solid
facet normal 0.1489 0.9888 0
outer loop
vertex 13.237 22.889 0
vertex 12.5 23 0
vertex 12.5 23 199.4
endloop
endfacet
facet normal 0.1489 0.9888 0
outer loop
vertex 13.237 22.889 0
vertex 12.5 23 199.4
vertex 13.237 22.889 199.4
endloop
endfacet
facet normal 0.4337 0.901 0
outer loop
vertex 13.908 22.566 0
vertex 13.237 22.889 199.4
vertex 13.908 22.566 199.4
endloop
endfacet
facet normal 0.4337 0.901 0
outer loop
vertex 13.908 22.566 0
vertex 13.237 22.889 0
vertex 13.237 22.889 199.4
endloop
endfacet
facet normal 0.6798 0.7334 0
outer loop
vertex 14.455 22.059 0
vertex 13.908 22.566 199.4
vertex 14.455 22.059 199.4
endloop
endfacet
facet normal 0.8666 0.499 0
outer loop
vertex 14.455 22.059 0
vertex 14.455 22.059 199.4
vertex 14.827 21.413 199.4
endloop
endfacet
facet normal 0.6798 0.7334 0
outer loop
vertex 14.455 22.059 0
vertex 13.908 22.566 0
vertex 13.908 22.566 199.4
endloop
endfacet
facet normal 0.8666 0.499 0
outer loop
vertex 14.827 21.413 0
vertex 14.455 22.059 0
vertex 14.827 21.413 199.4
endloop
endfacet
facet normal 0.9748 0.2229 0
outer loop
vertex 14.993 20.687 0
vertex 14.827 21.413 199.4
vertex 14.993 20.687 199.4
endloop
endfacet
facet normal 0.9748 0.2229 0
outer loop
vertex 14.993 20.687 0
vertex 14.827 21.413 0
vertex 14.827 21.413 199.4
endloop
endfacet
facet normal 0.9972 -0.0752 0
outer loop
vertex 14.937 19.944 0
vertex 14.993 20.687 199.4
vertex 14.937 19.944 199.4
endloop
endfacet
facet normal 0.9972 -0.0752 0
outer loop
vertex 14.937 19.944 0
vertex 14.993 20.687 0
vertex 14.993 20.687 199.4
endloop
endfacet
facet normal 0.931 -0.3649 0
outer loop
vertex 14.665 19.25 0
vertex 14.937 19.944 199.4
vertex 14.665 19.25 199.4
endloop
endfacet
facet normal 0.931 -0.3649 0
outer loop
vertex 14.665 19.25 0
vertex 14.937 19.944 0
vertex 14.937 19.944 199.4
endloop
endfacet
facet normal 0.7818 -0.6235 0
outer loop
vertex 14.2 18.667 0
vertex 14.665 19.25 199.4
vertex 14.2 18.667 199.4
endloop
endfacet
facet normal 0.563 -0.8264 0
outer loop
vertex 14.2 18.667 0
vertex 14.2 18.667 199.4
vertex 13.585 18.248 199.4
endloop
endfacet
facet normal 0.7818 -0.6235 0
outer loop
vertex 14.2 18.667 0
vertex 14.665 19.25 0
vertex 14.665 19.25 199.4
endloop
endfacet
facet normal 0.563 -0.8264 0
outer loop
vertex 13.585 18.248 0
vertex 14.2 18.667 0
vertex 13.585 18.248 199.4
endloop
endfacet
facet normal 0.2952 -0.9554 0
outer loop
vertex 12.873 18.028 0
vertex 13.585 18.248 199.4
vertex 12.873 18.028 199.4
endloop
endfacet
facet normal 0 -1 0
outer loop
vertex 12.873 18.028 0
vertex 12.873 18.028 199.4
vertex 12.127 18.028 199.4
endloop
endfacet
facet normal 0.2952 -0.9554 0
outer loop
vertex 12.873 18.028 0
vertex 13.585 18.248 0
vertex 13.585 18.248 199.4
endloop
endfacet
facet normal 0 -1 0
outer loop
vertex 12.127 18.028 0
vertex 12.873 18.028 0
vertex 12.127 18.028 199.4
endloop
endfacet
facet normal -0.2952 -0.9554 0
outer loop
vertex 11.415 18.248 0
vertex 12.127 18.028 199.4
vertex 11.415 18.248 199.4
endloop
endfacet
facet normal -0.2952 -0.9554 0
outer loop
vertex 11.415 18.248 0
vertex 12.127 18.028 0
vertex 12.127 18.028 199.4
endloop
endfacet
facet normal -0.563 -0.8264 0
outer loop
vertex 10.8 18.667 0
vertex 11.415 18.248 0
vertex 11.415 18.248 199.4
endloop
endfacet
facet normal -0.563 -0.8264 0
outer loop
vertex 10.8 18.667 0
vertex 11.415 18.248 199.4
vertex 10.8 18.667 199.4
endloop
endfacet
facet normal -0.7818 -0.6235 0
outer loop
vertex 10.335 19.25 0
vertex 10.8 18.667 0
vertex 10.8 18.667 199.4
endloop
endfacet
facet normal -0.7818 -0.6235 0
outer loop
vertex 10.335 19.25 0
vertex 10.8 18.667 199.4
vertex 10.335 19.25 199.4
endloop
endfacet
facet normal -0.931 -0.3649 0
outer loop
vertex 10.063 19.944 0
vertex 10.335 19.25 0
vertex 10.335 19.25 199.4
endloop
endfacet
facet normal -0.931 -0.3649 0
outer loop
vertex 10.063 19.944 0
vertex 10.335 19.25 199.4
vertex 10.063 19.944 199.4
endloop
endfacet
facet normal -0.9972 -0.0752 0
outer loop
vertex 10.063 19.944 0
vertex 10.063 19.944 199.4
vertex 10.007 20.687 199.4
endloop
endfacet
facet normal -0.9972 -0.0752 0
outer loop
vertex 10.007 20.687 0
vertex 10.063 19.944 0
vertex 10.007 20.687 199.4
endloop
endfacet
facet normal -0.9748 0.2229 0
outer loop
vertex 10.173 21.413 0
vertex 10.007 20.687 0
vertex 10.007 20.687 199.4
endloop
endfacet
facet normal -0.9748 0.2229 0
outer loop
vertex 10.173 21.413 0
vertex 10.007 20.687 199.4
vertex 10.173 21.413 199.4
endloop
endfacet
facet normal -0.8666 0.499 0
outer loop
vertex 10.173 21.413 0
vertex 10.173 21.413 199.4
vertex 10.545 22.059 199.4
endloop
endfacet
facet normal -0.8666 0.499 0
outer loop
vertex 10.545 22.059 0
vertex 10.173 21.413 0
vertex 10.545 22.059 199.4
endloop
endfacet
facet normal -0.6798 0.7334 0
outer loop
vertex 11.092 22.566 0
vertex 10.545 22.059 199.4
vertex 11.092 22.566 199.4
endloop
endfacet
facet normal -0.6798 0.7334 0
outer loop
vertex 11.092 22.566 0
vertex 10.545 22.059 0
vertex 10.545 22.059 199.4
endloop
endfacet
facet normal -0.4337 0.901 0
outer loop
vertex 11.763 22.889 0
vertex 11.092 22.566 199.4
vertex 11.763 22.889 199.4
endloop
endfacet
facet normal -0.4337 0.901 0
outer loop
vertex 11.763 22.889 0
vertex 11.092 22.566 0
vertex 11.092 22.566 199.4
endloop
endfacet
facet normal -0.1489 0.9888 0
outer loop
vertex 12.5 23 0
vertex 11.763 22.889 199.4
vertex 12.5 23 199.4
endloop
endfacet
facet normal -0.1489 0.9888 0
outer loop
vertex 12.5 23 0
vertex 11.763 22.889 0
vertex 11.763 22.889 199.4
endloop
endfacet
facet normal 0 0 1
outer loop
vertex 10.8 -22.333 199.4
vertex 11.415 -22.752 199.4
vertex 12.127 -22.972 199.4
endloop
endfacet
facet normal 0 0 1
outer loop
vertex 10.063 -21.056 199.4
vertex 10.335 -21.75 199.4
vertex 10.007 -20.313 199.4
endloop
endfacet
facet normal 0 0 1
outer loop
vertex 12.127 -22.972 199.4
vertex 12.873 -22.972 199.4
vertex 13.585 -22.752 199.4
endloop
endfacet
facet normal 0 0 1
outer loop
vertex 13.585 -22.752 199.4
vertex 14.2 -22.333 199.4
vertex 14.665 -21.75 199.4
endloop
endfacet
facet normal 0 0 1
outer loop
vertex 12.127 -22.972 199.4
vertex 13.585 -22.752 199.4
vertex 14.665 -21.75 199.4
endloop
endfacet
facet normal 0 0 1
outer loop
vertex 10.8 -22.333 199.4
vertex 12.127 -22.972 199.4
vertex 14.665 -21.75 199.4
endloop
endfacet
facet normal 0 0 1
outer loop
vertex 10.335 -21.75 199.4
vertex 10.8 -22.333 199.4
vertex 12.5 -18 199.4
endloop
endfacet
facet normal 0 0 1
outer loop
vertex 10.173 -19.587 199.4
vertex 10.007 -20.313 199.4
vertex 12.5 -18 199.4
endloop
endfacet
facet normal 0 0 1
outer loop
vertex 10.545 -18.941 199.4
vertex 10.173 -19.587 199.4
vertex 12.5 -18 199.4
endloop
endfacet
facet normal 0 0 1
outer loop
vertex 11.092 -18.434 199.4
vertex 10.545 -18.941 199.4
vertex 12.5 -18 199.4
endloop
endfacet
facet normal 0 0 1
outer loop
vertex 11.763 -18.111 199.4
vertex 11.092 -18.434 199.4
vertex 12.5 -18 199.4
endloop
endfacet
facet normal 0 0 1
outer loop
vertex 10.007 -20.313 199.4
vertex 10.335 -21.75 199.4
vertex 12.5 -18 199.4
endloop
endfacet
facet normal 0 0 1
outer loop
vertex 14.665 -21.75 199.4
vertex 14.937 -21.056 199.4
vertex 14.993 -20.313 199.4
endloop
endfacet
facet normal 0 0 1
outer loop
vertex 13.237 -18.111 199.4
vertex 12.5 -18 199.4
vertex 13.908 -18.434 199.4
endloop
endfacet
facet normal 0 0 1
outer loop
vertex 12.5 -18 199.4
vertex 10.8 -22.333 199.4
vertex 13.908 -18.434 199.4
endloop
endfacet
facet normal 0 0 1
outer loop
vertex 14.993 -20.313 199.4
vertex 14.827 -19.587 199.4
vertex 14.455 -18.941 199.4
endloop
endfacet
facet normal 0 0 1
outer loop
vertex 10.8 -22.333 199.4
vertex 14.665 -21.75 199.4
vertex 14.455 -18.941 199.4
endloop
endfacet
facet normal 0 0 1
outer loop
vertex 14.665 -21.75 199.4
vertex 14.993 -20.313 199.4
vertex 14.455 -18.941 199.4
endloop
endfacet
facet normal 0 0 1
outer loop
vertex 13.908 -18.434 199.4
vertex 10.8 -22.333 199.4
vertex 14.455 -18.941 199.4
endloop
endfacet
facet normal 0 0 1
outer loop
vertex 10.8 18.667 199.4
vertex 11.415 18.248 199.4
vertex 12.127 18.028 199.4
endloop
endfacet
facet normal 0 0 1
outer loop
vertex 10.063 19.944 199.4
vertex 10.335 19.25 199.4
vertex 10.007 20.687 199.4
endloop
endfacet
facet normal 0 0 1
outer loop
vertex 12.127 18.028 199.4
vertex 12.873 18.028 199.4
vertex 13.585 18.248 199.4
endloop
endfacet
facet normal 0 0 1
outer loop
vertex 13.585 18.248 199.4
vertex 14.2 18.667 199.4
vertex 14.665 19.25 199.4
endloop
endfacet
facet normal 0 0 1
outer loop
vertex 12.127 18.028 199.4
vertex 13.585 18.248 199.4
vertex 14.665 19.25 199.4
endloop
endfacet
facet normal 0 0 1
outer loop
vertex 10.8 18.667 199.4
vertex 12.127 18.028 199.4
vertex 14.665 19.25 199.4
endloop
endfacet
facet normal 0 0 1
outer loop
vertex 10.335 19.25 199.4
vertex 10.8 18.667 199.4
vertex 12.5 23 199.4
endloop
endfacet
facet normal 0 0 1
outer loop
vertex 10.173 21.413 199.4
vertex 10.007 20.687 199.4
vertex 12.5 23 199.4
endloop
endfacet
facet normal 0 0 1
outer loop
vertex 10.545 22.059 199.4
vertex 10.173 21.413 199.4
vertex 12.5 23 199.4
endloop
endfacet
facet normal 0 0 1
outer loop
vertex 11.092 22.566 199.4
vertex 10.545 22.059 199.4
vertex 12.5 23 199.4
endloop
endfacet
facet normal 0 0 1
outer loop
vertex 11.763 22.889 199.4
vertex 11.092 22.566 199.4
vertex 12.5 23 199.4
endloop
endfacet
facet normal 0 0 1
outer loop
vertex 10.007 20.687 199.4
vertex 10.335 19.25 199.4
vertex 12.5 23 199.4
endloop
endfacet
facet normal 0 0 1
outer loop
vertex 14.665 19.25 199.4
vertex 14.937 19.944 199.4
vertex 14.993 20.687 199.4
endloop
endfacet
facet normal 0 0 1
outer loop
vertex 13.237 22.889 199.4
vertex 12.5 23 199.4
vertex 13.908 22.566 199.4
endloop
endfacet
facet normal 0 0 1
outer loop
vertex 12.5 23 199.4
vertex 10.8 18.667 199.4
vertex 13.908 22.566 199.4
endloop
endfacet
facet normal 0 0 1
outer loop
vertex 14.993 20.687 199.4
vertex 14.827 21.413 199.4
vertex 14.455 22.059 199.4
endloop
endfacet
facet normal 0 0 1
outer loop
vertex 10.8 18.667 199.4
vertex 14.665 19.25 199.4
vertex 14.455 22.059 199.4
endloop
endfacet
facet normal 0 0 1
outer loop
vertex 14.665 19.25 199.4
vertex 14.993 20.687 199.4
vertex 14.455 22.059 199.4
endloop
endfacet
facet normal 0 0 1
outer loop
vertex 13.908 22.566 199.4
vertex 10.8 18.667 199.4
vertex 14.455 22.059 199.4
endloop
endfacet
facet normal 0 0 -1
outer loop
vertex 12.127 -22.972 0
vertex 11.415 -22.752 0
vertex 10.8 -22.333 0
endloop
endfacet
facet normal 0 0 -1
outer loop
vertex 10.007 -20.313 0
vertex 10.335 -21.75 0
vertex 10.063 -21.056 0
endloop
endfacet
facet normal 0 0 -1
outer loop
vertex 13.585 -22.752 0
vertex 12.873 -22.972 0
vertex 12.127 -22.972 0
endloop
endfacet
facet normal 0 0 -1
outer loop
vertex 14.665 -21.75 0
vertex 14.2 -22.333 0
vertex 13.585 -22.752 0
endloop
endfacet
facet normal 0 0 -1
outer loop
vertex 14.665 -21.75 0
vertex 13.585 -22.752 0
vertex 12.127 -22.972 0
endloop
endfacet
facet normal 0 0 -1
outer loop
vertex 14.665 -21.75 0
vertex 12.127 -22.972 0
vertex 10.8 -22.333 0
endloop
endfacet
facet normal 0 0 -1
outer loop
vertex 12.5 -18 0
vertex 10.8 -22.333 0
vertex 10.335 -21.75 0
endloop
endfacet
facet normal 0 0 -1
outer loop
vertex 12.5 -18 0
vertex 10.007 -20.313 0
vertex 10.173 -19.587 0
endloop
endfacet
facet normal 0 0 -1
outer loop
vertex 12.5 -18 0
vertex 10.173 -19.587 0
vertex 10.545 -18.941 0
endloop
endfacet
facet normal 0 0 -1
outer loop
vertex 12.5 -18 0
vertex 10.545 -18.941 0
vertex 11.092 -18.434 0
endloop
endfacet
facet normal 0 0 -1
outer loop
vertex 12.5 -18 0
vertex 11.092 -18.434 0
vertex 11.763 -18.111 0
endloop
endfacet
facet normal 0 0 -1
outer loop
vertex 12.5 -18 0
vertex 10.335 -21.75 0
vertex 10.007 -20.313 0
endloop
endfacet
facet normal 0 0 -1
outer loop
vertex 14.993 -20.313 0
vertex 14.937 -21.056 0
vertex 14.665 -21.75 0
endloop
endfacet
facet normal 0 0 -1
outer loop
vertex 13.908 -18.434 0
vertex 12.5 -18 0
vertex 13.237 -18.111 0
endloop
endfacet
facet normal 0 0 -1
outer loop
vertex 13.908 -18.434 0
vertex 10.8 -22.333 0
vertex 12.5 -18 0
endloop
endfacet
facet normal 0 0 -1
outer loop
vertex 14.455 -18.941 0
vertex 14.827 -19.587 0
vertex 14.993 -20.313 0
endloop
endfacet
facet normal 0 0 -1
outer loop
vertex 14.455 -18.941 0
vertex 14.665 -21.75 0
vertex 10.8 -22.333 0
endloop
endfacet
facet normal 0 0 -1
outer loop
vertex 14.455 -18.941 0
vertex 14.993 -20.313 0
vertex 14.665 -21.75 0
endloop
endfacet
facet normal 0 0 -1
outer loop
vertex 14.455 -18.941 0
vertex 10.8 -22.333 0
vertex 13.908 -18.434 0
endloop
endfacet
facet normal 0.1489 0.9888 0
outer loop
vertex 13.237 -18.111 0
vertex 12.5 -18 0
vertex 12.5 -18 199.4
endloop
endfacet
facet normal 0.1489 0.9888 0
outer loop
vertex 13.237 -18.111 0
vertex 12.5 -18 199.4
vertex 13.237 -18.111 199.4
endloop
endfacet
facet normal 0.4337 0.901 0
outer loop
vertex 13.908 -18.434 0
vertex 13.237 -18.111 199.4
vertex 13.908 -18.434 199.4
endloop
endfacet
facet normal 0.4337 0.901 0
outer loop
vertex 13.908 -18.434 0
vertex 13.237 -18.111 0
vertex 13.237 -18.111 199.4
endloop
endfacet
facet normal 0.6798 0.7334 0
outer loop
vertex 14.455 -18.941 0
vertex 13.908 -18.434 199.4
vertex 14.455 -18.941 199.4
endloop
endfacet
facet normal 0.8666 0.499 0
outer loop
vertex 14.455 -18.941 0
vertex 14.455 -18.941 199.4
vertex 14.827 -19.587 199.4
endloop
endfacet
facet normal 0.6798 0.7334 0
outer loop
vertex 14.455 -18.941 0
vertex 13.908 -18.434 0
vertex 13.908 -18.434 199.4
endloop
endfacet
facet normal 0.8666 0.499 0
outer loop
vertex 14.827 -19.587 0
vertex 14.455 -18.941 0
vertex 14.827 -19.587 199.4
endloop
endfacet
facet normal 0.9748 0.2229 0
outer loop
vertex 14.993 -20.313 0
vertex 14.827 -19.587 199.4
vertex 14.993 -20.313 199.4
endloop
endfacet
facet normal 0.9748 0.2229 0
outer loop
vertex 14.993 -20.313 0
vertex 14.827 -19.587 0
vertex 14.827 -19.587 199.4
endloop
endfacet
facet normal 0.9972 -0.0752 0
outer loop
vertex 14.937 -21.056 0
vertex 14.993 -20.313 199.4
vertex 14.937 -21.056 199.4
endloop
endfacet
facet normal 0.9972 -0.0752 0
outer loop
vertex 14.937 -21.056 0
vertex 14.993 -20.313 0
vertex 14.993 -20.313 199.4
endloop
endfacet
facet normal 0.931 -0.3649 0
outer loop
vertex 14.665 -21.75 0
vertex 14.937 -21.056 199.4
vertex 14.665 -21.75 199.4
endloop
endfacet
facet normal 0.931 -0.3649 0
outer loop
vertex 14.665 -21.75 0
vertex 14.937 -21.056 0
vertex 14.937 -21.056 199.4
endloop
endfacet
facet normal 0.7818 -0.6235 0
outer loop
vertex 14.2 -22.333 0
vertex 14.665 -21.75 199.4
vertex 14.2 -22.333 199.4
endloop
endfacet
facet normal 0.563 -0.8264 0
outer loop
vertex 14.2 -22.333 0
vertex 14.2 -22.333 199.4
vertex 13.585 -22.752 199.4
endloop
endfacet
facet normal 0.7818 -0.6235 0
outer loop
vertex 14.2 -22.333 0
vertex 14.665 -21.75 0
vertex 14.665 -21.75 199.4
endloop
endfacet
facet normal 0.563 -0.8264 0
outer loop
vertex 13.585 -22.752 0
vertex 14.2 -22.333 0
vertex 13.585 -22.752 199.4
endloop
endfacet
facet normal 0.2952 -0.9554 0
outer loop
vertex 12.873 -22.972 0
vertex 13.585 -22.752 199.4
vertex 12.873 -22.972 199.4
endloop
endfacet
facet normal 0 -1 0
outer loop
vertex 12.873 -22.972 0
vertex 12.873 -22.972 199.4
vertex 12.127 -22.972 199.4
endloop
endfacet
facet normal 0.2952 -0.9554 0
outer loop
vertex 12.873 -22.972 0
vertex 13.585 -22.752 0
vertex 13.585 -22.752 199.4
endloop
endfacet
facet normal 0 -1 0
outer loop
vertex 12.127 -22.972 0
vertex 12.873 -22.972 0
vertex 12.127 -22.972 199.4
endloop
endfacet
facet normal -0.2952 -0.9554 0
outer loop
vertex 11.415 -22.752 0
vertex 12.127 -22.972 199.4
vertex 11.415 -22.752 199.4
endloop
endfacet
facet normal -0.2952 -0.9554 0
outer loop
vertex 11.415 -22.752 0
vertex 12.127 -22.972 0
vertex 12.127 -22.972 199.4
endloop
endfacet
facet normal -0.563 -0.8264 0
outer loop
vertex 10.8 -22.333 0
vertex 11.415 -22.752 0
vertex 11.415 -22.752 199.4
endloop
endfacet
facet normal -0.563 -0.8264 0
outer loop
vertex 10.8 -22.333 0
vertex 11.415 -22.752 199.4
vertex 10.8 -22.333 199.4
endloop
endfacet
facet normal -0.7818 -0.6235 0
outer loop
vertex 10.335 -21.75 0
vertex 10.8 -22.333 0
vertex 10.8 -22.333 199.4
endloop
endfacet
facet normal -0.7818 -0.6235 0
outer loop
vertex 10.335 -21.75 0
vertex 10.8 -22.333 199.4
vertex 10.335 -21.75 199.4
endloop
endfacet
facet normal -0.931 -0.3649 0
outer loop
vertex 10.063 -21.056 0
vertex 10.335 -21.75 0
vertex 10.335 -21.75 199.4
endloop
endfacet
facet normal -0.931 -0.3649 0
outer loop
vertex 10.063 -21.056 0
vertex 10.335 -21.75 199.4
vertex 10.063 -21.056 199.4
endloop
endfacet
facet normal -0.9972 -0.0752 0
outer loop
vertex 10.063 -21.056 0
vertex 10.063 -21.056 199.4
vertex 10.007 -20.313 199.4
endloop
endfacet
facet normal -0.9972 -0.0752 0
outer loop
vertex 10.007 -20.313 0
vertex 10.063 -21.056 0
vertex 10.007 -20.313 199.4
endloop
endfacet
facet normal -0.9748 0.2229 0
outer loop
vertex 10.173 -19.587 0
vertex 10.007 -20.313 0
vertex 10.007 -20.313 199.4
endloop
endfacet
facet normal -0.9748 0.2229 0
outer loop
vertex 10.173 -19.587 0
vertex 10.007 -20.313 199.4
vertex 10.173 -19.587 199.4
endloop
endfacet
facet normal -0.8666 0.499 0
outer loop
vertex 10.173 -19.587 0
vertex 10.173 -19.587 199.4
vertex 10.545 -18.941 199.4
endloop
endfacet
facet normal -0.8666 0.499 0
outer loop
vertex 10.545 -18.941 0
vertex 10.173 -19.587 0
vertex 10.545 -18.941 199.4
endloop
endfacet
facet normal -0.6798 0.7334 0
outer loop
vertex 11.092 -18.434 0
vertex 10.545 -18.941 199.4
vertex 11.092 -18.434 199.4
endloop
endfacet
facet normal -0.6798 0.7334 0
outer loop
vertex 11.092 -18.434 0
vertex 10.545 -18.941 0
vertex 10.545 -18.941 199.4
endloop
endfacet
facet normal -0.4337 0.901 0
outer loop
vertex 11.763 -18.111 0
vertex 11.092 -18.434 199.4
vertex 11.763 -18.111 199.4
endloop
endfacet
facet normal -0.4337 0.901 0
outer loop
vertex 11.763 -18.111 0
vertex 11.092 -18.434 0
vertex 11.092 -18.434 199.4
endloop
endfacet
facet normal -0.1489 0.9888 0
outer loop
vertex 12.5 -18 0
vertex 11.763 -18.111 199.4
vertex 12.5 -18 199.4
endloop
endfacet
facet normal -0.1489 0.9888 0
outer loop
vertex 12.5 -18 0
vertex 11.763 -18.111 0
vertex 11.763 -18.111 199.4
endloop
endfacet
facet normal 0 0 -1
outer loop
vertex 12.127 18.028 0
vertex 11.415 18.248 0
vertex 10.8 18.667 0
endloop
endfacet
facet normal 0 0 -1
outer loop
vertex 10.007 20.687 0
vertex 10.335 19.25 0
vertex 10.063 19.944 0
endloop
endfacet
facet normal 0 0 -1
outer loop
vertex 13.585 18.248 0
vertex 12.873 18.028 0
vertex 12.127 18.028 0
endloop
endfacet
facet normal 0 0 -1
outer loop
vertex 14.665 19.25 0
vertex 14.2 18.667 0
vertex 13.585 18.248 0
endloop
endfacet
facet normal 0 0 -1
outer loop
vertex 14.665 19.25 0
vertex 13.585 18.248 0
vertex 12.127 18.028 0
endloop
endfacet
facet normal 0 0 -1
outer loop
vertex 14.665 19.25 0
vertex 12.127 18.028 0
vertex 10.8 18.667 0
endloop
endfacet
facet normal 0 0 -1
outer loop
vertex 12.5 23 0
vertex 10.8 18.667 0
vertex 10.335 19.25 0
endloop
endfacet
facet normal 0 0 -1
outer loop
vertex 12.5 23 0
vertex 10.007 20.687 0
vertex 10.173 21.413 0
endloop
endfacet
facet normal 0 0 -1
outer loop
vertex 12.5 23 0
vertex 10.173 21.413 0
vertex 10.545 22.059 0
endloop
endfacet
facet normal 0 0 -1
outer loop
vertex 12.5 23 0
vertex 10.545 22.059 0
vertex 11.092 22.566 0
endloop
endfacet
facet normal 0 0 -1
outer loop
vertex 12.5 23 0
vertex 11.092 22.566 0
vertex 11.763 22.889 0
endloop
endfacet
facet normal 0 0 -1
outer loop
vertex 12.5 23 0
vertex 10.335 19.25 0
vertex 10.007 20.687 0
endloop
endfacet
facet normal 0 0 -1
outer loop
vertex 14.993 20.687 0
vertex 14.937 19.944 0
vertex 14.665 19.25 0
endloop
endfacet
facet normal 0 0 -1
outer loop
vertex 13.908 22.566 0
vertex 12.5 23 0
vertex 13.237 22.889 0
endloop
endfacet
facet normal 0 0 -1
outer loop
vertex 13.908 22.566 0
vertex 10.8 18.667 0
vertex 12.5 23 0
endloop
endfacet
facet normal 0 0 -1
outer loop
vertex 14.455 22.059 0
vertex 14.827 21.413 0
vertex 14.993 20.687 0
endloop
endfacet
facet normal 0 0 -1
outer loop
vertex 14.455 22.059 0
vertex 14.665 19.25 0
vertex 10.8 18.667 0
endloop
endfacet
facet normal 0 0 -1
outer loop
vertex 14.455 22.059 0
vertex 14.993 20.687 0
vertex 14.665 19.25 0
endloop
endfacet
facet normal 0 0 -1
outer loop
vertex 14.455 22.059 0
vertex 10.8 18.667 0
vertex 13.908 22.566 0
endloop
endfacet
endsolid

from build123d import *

# Parameters (mm, degrees)
BINDER_R      = 2.5
EXTRUDE_DEPTH = 199.4


with BuildPart() as extrude_body:
    # Binder → Extrude (new body)
    with BuildSketch(Plane(origin=(-12.5, -20.5, 0), x_dir=(0, 1, 0), z_dir=(0, 0, 1))):
        Circle(BINDER_R)
        with Locations((41, 0)):
            Circle(BINDER_R)
    extrude(amount=EXTRUDE_DEPTH)


with BuildPart() as mirror:
    # Part__Mirroring: instance of Extrude body
    add(extrude_body.part.mirror(Plane(origin=(0, 0, 0), x_dir=(0, -1, 0), z_dir=(1, 0, 0))))


solid = mirror.part
